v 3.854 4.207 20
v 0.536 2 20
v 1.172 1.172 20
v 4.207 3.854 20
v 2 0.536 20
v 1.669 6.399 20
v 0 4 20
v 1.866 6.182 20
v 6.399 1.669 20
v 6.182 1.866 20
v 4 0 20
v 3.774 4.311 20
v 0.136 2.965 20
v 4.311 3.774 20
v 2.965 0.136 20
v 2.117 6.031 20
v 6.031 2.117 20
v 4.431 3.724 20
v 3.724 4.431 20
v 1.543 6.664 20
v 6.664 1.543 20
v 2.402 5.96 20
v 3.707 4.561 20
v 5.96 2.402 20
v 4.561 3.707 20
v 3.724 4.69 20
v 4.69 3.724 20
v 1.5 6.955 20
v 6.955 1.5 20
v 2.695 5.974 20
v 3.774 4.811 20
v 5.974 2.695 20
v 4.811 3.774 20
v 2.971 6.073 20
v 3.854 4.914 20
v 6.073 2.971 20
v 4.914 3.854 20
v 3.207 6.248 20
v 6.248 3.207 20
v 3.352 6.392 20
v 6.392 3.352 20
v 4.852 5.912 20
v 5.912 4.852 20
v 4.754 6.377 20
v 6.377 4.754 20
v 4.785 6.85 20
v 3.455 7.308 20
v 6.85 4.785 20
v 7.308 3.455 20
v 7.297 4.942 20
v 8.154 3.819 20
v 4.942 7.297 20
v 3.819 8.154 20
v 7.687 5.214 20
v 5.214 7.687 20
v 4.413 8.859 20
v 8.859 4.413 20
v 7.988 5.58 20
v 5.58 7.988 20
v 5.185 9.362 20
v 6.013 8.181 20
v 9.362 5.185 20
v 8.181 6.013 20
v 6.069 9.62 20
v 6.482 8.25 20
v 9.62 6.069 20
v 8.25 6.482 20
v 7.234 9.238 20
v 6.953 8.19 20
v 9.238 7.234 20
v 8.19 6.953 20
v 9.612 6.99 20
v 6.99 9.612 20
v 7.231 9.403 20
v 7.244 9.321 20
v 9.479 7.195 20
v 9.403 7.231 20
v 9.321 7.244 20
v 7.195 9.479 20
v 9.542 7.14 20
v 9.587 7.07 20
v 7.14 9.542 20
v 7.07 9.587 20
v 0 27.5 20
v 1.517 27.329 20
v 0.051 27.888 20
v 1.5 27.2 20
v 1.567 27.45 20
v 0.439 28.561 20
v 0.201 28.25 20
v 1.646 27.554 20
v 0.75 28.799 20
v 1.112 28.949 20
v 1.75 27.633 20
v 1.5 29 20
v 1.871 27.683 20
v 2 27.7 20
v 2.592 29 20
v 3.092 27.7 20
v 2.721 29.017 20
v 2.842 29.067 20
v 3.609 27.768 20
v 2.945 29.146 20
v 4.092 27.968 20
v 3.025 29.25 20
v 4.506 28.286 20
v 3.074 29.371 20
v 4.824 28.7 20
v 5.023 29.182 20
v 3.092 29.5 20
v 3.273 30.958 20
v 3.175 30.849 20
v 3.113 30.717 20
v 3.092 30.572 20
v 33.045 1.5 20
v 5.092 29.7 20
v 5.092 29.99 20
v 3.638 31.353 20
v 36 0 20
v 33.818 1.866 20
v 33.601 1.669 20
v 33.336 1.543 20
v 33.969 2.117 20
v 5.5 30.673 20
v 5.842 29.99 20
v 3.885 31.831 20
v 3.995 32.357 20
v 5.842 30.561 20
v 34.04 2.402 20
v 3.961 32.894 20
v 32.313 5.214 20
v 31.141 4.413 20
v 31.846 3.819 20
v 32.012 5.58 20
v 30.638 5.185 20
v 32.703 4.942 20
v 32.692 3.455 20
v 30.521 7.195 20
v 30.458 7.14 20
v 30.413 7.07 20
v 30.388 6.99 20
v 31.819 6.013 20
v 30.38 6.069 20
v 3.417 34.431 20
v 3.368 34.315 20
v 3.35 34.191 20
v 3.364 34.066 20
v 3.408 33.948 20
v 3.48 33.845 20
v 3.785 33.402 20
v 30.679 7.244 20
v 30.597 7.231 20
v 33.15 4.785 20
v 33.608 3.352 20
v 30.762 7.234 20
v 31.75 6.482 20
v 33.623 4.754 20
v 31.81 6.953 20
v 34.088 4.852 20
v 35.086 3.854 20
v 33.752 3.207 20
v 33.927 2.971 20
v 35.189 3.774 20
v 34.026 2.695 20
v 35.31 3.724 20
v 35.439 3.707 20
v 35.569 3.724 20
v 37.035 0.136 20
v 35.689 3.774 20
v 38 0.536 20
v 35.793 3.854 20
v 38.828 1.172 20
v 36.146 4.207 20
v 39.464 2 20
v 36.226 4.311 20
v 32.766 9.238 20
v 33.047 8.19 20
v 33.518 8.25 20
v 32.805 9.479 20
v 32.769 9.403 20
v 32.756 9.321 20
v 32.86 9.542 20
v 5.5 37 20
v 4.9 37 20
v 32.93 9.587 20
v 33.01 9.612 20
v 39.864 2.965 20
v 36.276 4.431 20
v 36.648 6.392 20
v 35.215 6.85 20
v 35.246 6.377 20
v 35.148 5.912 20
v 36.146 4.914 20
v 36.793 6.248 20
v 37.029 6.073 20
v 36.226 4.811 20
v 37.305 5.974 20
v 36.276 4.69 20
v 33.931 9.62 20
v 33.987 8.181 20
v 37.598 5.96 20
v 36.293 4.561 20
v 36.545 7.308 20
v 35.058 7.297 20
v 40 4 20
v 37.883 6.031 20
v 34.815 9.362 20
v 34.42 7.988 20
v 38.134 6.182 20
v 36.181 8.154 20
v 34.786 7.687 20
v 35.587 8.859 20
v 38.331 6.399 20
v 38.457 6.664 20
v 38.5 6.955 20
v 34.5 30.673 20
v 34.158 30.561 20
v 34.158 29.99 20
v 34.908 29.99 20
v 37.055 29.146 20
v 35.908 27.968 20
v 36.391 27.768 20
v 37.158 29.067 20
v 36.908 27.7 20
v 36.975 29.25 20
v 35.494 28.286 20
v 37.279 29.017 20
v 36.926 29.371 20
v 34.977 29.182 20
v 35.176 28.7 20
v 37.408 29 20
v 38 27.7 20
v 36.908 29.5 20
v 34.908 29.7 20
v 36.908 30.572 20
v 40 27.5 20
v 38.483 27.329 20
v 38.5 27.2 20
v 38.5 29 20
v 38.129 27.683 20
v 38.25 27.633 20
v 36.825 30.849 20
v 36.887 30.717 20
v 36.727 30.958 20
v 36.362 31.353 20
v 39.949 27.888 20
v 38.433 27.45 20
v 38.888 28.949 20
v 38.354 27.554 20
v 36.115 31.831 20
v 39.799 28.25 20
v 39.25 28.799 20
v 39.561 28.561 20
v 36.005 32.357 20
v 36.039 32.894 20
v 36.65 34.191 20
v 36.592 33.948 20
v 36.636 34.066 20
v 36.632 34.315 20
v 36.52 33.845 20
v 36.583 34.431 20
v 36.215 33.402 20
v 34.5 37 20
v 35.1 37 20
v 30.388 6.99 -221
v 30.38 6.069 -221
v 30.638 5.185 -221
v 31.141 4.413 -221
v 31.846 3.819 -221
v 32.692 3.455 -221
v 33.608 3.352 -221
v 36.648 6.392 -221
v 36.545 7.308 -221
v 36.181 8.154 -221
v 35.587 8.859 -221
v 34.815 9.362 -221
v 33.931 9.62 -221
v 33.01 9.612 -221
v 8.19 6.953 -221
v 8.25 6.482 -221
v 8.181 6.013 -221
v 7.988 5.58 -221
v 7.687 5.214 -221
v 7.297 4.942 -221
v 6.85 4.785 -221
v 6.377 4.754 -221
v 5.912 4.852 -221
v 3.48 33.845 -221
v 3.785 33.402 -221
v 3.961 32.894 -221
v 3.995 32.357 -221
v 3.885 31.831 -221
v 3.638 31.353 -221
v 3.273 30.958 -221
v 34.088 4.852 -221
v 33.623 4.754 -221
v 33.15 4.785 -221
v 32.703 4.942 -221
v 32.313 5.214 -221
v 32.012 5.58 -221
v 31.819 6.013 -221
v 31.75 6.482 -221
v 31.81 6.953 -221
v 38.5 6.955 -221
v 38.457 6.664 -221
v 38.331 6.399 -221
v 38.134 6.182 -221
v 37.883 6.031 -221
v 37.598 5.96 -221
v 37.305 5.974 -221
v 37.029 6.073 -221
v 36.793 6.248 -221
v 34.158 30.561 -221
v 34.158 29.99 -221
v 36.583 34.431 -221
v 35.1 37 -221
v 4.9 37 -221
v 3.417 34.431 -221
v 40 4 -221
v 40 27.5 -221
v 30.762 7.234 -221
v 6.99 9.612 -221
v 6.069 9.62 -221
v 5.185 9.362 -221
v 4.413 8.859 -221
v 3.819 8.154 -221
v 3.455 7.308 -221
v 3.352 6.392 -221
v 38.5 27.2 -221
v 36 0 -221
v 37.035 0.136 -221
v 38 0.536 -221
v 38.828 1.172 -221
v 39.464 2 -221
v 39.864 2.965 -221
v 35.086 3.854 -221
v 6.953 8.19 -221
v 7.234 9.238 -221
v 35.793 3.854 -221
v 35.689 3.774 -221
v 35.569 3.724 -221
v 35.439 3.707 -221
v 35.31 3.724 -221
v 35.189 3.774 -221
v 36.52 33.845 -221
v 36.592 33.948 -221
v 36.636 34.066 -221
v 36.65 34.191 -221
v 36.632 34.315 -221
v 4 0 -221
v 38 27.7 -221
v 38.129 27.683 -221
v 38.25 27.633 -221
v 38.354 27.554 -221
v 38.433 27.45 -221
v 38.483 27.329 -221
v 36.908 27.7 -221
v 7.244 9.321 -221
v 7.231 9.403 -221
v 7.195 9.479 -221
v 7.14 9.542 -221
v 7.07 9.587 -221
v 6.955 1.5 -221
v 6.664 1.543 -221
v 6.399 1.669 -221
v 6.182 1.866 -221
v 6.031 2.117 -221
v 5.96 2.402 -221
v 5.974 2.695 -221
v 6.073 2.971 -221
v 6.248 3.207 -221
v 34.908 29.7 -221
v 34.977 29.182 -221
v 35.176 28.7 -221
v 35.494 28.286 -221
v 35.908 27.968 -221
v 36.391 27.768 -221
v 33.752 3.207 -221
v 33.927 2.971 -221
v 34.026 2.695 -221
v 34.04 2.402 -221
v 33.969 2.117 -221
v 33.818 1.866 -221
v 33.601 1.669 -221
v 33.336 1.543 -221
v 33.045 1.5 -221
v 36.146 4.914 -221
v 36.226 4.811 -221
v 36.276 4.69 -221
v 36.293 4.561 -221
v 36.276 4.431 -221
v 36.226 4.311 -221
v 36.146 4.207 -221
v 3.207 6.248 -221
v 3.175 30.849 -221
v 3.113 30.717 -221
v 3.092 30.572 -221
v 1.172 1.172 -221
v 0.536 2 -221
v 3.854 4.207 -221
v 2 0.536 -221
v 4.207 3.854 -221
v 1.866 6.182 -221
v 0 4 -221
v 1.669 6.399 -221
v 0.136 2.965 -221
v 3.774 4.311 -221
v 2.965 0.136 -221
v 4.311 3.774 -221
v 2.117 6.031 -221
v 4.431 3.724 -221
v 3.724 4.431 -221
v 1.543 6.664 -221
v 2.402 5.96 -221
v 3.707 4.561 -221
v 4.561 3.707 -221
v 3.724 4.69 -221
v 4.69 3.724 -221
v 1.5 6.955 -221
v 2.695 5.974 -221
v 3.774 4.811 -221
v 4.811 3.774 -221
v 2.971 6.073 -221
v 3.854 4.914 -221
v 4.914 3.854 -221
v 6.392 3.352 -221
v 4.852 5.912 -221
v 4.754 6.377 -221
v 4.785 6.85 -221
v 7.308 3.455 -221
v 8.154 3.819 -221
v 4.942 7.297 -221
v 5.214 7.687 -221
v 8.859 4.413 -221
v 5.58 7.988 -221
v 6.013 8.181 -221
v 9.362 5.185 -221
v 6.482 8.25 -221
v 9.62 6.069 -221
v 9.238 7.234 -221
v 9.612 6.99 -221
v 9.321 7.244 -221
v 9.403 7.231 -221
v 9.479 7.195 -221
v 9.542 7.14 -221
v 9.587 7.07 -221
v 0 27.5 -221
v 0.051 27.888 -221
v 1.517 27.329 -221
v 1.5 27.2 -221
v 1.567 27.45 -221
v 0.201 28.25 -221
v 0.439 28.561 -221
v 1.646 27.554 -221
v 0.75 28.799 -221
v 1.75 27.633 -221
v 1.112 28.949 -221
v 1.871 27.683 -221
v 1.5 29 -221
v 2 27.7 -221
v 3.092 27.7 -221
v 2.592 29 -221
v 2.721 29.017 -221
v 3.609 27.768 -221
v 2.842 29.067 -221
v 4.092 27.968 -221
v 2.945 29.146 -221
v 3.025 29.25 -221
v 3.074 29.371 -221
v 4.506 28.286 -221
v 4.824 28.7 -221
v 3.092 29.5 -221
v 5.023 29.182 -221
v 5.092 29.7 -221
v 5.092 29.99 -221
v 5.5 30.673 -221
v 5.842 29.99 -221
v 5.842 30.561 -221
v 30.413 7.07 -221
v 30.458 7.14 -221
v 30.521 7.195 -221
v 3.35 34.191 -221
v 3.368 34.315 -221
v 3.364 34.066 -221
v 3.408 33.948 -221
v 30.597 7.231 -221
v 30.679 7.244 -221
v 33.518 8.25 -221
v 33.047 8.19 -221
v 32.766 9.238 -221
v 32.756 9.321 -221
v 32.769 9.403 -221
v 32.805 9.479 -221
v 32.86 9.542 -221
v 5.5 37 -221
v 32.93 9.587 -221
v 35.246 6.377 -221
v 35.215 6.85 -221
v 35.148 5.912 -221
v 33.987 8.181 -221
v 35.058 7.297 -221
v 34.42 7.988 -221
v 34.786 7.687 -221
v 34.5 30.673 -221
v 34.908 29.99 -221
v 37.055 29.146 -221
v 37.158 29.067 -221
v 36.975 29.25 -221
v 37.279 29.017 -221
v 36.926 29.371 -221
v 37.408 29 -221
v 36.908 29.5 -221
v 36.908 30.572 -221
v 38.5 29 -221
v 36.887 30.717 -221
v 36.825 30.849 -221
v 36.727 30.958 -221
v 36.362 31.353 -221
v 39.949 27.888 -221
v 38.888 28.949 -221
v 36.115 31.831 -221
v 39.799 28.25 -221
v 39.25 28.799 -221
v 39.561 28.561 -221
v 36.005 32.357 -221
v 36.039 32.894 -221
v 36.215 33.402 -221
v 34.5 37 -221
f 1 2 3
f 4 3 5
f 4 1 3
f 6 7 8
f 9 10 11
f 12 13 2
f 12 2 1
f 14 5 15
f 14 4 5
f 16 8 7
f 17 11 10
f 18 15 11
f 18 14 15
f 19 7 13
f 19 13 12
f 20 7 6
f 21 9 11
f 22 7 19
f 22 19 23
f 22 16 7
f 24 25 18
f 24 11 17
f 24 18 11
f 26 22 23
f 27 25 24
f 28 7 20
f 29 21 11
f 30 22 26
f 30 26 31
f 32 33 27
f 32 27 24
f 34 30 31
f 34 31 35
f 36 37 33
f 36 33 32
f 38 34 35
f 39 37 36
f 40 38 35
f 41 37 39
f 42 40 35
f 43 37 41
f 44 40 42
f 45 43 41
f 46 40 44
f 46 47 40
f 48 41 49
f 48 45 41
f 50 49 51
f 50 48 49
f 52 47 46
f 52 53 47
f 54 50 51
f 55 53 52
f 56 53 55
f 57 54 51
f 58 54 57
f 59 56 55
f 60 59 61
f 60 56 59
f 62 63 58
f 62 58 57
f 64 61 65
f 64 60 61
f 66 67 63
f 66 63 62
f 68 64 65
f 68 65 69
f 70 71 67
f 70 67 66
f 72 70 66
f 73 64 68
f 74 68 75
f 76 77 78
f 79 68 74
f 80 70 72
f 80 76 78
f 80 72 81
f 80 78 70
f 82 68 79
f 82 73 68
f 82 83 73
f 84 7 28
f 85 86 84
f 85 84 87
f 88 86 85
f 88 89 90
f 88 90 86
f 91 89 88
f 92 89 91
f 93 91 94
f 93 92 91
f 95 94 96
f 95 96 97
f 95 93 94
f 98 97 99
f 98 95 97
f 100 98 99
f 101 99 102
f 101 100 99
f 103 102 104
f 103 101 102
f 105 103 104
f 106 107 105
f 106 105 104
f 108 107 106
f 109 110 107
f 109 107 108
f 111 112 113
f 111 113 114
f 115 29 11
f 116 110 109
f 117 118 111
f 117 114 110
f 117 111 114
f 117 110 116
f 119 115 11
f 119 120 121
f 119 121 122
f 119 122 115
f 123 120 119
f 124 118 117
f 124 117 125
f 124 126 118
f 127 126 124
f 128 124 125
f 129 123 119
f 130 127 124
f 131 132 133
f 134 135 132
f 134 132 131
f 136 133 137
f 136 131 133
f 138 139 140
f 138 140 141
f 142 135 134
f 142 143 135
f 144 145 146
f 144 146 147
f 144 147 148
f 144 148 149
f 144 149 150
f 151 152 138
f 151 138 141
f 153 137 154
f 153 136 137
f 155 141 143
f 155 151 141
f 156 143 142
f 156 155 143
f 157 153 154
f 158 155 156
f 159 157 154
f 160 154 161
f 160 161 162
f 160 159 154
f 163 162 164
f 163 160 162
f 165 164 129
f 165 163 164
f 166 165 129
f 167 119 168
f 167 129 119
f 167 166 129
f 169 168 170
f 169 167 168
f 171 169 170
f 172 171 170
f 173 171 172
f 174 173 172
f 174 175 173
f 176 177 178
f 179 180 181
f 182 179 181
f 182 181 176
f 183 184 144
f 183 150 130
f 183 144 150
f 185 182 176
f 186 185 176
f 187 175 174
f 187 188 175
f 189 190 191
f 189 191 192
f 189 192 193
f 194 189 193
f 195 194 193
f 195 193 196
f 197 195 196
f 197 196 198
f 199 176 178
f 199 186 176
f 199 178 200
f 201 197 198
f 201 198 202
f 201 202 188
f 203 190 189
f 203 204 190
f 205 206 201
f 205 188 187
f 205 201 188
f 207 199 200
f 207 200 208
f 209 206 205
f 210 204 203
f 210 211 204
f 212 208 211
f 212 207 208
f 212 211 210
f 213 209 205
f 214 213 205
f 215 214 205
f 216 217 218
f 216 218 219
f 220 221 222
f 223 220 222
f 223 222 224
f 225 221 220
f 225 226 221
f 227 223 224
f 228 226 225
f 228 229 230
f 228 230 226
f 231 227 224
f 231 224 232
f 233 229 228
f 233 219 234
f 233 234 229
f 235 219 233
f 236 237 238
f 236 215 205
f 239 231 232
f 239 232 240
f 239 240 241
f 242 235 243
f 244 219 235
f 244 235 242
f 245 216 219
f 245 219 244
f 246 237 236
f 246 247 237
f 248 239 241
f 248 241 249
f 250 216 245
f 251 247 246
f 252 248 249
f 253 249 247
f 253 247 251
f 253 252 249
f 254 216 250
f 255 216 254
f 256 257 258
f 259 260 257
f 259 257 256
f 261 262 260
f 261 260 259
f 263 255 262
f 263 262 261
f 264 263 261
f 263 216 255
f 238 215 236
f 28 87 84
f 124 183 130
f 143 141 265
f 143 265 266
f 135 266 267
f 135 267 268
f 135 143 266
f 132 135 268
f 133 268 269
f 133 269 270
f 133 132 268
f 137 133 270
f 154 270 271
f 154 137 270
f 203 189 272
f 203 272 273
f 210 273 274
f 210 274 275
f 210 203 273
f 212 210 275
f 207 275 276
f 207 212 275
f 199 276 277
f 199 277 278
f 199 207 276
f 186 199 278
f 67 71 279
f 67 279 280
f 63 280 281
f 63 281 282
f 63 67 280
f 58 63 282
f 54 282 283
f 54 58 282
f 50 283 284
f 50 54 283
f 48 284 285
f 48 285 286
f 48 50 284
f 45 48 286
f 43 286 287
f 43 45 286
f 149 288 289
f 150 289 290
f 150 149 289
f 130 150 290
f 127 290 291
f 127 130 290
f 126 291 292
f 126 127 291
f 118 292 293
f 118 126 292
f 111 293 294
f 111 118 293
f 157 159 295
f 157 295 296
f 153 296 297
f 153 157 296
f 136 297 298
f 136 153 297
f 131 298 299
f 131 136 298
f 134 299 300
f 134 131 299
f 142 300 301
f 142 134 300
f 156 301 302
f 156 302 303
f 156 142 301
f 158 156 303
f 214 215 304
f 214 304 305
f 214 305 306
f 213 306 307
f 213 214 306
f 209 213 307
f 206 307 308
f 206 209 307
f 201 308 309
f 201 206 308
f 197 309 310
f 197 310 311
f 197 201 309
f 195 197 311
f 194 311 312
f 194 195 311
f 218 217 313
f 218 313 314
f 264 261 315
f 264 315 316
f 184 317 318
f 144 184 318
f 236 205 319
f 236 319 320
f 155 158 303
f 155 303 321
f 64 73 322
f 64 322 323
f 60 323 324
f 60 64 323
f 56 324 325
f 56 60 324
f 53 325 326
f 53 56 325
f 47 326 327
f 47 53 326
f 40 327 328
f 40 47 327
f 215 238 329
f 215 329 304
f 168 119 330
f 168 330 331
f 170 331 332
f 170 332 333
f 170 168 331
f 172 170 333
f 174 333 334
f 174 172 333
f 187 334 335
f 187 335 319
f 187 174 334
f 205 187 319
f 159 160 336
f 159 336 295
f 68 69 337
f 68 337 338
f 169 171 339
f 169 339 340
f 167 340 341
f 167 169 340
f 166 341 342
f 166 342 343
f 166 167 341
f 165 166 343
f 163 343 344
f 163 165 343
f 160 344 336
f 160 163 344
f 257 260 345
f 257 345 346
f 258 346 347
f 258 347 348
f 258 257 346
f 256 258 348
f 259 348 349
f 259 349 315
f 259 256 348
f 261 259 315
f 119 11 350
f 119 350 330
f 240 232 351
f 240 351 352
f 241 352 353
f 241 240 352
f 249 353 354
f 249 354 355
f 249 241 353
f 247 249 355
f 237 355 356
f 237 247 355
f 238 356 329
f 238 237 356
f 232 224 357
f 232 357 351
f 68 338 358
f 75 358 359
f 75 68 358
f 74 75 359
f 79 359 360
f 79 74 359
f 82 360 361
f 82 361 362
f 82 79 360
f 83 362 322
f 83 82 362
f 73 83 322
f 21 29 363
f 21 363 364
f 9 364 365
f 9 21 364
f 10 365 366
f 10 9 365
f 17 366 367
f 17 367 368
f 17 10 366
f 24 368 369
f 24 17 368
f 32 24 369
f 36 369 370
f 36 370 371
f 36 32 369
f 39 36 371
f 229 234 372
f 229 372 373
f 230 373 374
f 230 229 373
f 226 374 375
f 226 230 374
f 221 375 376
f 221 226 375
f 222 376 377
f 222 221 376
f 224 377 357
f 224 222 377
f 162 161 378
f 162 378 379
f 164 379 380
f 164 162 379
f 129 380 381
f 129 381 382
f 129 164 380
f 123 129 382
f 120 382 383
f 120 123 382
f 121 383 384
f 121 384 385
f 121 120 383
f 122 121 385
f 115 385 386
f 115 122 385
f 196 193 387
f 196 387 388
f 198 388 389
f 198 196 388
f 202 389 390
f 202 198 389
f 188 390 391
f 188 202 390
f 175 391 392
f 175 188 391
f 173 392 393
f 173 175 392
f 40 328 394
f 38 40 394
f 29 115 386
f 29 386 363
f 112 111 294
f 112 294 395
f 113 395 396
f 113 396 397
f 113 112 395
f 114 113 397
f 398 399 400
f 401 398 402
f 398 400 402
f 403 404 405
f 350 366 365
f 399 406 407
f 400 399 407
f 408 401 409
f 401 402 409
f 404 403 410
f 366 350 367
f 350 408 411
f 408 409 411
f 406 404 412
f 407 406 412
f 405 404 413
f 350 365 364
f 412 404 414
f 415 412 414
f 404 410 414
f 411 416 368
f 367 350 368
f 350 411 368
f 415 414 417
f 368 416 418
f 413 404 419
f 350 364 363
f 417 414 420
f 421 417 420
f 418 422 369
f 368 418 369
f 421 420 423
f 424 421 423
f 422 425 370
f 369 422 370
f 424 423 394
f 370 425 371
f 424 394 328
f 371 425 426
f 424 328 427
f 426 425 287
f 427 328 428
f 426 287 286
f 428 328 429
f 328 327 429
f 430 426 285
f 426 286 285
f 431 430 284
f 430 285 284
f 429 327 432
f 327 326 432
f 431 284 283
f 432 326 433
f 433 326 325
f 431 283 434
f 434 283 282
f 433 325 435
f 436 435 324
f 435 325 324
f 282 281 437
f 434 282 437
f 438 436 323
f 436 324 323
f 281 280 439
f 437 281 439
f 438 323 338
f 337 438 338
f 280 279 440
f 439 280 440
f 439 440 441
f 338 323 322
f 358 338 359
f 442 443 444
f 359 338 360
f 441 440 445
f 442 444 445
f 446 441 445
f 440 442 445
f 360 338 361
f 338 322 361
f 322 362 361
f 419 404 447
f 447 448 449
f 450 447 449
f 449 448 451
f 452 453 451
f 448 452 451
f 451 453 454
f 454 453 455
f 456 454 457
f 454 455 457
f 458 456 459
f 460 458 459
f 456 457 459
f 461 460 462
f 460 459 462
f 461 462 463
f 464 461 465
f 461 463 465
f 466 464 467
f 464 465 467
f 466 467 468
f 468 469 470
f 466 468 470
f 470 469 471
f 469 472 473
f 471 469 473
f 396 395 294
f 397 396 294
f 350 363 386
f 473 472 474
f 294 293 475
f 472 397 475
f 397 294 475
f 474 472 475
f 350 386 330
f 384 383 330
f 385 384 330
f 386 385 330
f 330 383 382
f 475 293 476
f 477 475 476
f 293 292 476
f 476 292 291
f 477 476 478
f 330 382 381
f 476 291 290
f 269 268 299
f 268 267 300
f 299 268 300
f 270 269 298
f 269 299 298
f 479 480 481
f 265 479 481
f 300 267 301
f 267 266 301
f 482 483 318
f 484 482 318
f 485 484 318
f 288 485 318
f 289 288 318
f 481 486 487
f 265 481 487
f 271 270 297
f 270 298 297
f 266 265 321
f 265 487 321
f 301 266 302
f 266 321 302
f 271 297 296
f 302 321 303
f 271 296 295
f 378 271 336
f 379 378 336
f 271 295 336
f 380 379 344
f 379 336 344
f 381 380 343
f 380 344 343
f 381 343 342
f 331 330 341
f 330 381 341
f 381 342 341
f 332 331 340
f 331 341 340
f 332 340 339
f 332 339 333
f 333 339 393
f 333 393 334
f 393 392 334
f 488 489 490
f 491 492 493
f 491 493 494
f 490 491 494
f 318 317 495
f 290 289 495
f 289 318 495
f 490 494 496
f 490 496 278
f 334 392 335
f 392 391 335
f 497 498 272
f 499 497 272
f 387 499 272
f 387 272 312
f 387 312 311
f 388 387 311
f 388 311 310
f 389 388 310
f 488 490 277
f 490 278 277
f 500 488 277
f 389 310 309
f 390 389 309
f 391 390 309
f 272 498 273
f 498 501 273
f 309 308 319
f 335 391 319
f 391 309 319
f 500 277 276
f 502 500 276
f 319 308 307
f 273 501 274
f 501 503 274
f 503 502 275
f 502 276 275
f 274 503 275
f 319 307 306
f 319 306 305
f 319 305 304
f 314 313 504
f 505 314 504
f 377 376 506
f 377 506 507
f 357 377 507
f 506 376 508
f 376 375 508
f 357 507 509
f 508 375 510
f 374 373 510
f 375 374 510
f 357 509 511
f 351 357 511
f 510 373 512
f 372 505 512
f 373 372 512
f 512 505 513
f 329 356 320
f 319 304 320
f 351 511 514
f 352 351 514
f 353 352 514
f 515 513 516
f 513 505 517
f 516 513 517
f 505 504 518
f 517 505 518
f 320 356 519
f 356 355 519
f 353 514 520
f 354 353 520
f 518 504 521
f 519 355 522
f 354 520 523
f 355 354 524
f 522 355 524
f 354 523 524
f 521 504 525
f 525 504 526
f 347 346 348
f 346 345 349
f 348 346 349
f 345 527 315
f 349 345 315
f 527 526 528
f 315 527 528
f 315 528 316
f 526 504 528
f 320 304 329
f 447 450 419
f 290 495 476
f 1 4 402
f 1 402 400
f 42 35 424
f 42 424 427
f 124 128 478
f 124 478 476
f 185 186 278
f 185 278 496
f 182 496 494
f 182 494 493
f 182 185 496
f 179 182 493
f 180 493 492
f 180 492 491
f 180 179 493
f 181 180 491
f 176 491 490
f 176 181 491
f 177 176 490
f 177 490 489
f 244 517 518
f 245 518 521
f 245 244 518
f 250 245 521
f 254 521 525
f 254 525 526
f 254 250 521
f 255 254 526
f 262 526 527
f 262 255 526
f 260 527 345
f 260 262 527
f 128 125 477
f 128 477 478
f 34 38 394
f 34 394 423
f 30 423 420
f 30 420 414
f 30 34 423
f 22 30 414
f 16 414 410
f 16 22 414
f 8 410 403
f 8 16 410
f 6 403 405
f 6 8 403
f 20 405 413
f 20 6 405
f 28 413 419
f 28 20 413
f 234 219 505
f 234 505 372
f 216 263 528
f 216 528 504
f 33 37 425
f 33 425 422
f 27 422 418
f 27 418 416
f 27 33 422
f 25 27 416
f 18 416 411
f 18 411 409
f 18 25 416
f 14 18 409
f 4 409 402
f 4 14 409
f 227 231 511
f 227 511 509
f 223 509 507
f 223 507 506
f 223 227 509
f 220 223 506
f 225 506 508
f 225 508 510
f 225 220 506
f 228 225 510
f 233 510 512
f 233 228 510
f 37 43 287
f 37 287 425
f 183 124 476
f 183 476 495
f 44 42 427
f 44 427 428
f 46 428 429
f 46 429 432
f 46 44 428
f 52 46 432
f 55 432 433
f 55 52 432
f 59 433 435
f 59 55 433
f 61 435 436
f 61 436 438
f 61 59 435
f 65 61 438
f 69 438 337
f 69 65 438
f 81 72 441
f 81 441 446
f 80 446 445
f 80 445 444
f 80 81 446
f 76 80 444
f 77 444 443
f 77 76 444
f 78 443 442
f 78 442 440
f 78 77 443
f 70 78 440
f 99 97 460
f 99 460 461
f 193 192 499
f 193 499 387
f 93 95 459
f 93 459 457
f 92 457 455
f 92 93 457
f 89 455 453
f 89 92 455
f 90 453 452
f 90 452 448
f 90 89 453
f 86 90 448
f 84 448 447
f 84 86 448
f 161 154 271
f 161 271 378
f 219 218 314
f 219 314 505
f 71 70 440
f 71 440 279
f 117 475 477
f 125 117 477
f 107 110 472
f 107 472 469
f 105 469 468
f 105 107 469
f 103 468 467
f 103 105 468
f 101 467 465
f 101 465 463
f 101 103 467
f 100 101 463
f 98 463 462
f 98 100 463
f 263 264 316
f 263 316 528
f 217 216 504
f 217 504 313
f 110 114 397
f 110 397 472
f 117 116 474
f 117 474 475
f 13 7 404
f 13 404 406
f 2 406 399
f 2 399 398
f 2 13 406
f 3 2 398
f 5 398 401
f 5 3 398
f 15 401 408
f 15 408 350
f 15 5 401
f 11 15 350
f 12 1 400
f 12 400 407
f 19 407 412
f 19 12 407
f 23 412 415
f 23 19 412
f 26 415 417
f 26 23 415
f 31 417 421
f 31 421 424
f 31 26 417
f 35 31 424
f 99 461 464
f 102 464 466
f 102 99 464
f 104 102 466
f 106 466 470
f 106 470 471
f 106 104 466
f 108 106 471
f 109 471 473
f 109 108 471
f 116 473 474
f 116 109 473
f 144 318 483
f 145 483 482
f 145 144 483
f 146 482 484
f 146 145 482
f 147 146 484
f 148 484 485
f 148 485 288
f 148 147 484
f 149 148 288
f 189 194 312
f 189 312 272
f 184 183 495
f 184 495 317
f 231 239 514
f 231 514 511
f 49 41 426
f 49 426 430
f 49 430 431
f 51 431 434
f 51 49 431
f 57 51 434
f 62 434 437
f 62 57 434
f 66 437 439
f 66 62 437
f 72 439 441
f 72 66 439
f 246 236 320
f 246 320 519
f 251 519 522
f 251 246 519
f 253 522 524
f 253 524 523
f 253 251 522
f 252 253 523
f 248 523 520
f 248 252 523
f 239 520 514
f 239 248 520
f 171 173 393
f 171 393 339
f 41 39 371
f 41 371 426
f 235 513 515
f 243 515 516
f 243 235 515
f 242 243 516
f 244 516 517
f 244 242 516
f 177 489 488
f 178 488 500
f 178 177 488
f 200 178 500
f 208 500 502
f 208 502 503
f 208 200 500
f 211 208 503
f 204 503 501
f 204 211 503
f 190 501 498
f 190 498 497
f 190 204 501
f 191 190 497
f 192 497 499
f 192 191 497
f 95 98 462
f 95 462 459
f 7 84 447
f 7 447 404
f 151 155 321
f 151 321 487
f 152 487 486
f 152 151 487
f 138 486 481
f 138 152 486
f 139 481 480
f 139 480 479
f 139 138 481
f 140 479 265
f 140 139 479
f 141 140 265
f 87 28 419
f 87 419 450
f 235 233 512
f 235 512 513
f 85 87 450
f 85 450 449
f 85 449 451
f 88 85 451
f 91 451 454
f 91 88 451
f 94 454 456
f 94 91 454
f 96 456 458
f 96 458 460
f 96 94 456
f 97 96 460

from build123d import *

# Parameters (mm, degrees)
BOSS_EXTRUDE1_DEPTH = 241


with BuildPart() as part:
    # Sketch1 → Boss-Extrude1 (new body)
    with BuildSketch(Plane.XY.offset(20)):
        with BuildLine():
            Line((4, 0), (36, 0))
            ThreePointArc((36, 0), (38.828427125, 1.171572875), (40, 4))
            Line((40, 4), (40, 27.499999994))
            ThreePointArc((40, 27.499999994), (39.56066017, 28.56066017), (38.499999994, 29))
            Line((38.499999994, 29), (37.408493132, 29))
            ThreePointArc((37.408493132, 29), (37.05493974, 29.14644661), (36.90849313, 29.500000002))
            Line((36.90849313, 29.500000002), (36.90849313, 30.572020267))
            ThreePointArc((36.90849313, 30.572020267), (36.86079319, 30.785150869), (36.726794508, 30.957616203))
            ThreePointArc((36.726794508, 30.957616203), (36.005111578, 32.357100716), (36.519951827, 33.845160752))
            ThreePointArc((36.519951827, 33.845160752), (36.647077826, 34.128030253), (36.582952488, 34.431450944))
            Line((36.582952488, 34.431450944), (35.099999998, 37.000000001))
            Line((35.099999998, 37.000000001), (34.500000002, 37.000000001))
            Line((34.500000002, 37.000000001), (34.500000002, 30.672689193))
            Line((34.500000002, 30.672689193), (34.158493132, 30.561067543))
            Line((34.158493132, 30.561067543), (34.158493132, 29.989862813))
            Line((34.158493132, 29.989862813), (34.908493132, 29.989862813))
            Line((34.908493132, 29.989862813), (34.908493132, 29.700000011))
            ThreePointArc((34.908493132, 29.700000011), (35.494279572, 28.285786443), (36.908493141, 27.700000003))
            Line((36.908493141, 27.700000003), (38.000000017, 27.700000003))
            ThreePointArc((38.000000017, 27.700000003), (38.353553409, 27.553553393), (38.500000019, 27.200000001))
            Line((38.500000019, 27.200000001), (38.500000019, 6.9547727))
            ThreePointArc((38.500000019, 6.9547727), (37.882683451, 6.030893167), (36.792893237, 6.247665919))
            Line((36.792893237, 6.247665919), (36.648161659, 6.392397496))
            ThreePointArc((36.648161659, 6.392397496), (35.587251229, 8.859212237), (33.009530056, 9.611581471))
            ThreePointArc((33.009530056, 9.611581471), (32.804700675, 9.478725012), (32.766463725, 9.237594653))
            Line((32.766463725, 9.237594653), (33.047066675, 8.190370192))
            ThreePointArc((33.047066675, 8.190370192), (34.786339421, 7.686520507), (35.148364083, 5.912296075))
            Line((35.148364083, 5.912296075), (36.146446608, 4.91421355))
            ThreePointArc((36.146446608, 4.91421355), (36.292893217, 4.560660161), (36.146446608, 4.207106773))
            Line((36.146446608, 4.207106773), (35.792893214, 3.853553379))
            ThreePointArc((35.792893214, 3.853553379), (35.439339826, 3.70710677), (35.085786437, 3.853553379))
            Line((35.085786437, 3.853553379), (34.087703906, 4.85163591))
            ThreePointArc((34.087703906, 4.85163591), (32.313479487, 5.213660585), (31.809629807, 6.952933321))
            Line((31.809629807, 6.952933321), (30.762405333, 7.233536272))
            ThreePointArc((30.762405333, 7.233536272), (30.521274984, 7.195299323), (30.38841853, 6.990469949))
            ThreePointArc((30.38841853, 6.990469949), (31.140787752, 4.412748784), (33.607602477, 3.351838341))
            Line((33.607602477, 3.351838341), (33.752334032, 3.207106785))
            ThreePointArc((33.752334032, 3.207106785), (33.969106782, 2.117316579), (33.045227255, 1.500000015))
            Line((33.045227255, 1.500000015), (6.954772716, 1.500000015))
            ThreePointArc((6.954772716, 1.500000015), (6.030893183, 2.117316583), (6.247665934, 3.207106797))
            Line((6.247665934, 3.207106797), (6.392397512, 3.351838375))
            ThreePointArc((6.392397512, 3.351838375), (8.859212224, 4.412748803), (9.611581449, 6.990469949))
            ThreePointArc((9.611581449, 6.990469949), (9.478724996, 7.195299323), (9.237594646, 7.233536272))
            Line((9.237594646, 7.233536272), (8.190370187, 6.952933328))
            ThreePointArc((8.190370187, 6.952933328), (7.686520502, 5.213660596), (5.912296085, 4.851635932))
            Line((5.912296085, 4.851635932), (4.914213553, 3.8535534))
            ThreePointArc((4.914213553, 3.8535534), (4.560660164, 3.707106791), (4.207106776, 3.8535534))
            Line((4.207106776, 3.8535534), (3.853553388, 4.207106787))
            ThreePointArc((3.853553388, 4.207106787), (3.70710678, 4.560660175), (3.853553388, 4.914213564))
            Line((3.853553388, 4.914213564), (4.85163592, 5.912296095))
            ThreePointArc((4.85163592, 5.912296095), (5.213660585, 7.686520517), (6.952933322, 8.190370198))
            Line((6.952933322, 8.190370198), (7.233536268, 9.237594644))
            ThreePointArc((7.233536268, 9.237594644), (7.195299318, 9.478725003), (6.990469936, 9.611581462))
            ThreePointArc((6.990469936, 9.611581462), (4.412748785, 8.859212233), (3.351838362, 6.392397513))
            Line((3.351838362, 6.392397513), (3.207106785, 6.247665935))
            ThreePointArc((3.207106785, 6.247665935), (2.11731657, 6.030893183), (1.500000002, 6.954772717))
            Line((1.500000002, 6.954772717), (1.500000002, 27.200000001))
            ThreePointArc((1.500000002, 27.200000001), (1.646446612, 27.553553393), (2.000000004, 27.700000003))
            Line((2.000000004, 27.700000003), (3.091506864, 27.700000003))
            ThreePointArc((3.091506864, 27.700000003), (4.505720432, 28.285786443), (5.091506872, 29.700000011))
            Line((5.091506872, 29.700000011), (5.091506872, 29.989862813))
            Line((5.091506872, 29.989862813), (5.841506868, 29.989862813))
            Line((5.841506868, 29.989862813), (5.841506868, 30.561067541))
            Line((5.841506868, 30.561067541), (5.499999998, 30.672689191))
            Line((5.499999998, 30.672689191), (5.499999998, 37.000000001))
            Line((5.499999998, 37.000000001), (4.899999998, 37.000000001))
            Line((4.899999998, 37.000000001), (3.417047508, 34.431450944))
            ThreePointArc((3.417047508, 34.431450944), (3.35292217, 34.128030253), (3.480048169, 33.845160751))
            ThreePointArc((3.480048169, 33.845160751), (3.99488842, 32.357100716), (3.273205491, 30.957616203))
            ThreePointArc((3.273205491, 30.957616203), (3.13920681, 30.785150869), (3.09150687, 30.572020267))
            Line((3.09150687, 30.572020267), (3.09150687, 29.500000002))
            ThreePointArc((3.09150687, 29.500000002), (2.94506026, 29.14644661), (2.591506868, 29))
            Line((2.591506868, 29), (1.500000006, 29))
            ThreePointArc((1.500000006, 29), (0.43933983, 28.56066017), (0, 27.499999994))
            Line((0, 27.499999994), (0, 4))
            ThreePointArc((0, 4), (1.171572875, 1.171572875), (4, 0))
        make_face()
    extrude(amount=-BOSS_EXTRUDE1_DEPTH)


solid = part.part
